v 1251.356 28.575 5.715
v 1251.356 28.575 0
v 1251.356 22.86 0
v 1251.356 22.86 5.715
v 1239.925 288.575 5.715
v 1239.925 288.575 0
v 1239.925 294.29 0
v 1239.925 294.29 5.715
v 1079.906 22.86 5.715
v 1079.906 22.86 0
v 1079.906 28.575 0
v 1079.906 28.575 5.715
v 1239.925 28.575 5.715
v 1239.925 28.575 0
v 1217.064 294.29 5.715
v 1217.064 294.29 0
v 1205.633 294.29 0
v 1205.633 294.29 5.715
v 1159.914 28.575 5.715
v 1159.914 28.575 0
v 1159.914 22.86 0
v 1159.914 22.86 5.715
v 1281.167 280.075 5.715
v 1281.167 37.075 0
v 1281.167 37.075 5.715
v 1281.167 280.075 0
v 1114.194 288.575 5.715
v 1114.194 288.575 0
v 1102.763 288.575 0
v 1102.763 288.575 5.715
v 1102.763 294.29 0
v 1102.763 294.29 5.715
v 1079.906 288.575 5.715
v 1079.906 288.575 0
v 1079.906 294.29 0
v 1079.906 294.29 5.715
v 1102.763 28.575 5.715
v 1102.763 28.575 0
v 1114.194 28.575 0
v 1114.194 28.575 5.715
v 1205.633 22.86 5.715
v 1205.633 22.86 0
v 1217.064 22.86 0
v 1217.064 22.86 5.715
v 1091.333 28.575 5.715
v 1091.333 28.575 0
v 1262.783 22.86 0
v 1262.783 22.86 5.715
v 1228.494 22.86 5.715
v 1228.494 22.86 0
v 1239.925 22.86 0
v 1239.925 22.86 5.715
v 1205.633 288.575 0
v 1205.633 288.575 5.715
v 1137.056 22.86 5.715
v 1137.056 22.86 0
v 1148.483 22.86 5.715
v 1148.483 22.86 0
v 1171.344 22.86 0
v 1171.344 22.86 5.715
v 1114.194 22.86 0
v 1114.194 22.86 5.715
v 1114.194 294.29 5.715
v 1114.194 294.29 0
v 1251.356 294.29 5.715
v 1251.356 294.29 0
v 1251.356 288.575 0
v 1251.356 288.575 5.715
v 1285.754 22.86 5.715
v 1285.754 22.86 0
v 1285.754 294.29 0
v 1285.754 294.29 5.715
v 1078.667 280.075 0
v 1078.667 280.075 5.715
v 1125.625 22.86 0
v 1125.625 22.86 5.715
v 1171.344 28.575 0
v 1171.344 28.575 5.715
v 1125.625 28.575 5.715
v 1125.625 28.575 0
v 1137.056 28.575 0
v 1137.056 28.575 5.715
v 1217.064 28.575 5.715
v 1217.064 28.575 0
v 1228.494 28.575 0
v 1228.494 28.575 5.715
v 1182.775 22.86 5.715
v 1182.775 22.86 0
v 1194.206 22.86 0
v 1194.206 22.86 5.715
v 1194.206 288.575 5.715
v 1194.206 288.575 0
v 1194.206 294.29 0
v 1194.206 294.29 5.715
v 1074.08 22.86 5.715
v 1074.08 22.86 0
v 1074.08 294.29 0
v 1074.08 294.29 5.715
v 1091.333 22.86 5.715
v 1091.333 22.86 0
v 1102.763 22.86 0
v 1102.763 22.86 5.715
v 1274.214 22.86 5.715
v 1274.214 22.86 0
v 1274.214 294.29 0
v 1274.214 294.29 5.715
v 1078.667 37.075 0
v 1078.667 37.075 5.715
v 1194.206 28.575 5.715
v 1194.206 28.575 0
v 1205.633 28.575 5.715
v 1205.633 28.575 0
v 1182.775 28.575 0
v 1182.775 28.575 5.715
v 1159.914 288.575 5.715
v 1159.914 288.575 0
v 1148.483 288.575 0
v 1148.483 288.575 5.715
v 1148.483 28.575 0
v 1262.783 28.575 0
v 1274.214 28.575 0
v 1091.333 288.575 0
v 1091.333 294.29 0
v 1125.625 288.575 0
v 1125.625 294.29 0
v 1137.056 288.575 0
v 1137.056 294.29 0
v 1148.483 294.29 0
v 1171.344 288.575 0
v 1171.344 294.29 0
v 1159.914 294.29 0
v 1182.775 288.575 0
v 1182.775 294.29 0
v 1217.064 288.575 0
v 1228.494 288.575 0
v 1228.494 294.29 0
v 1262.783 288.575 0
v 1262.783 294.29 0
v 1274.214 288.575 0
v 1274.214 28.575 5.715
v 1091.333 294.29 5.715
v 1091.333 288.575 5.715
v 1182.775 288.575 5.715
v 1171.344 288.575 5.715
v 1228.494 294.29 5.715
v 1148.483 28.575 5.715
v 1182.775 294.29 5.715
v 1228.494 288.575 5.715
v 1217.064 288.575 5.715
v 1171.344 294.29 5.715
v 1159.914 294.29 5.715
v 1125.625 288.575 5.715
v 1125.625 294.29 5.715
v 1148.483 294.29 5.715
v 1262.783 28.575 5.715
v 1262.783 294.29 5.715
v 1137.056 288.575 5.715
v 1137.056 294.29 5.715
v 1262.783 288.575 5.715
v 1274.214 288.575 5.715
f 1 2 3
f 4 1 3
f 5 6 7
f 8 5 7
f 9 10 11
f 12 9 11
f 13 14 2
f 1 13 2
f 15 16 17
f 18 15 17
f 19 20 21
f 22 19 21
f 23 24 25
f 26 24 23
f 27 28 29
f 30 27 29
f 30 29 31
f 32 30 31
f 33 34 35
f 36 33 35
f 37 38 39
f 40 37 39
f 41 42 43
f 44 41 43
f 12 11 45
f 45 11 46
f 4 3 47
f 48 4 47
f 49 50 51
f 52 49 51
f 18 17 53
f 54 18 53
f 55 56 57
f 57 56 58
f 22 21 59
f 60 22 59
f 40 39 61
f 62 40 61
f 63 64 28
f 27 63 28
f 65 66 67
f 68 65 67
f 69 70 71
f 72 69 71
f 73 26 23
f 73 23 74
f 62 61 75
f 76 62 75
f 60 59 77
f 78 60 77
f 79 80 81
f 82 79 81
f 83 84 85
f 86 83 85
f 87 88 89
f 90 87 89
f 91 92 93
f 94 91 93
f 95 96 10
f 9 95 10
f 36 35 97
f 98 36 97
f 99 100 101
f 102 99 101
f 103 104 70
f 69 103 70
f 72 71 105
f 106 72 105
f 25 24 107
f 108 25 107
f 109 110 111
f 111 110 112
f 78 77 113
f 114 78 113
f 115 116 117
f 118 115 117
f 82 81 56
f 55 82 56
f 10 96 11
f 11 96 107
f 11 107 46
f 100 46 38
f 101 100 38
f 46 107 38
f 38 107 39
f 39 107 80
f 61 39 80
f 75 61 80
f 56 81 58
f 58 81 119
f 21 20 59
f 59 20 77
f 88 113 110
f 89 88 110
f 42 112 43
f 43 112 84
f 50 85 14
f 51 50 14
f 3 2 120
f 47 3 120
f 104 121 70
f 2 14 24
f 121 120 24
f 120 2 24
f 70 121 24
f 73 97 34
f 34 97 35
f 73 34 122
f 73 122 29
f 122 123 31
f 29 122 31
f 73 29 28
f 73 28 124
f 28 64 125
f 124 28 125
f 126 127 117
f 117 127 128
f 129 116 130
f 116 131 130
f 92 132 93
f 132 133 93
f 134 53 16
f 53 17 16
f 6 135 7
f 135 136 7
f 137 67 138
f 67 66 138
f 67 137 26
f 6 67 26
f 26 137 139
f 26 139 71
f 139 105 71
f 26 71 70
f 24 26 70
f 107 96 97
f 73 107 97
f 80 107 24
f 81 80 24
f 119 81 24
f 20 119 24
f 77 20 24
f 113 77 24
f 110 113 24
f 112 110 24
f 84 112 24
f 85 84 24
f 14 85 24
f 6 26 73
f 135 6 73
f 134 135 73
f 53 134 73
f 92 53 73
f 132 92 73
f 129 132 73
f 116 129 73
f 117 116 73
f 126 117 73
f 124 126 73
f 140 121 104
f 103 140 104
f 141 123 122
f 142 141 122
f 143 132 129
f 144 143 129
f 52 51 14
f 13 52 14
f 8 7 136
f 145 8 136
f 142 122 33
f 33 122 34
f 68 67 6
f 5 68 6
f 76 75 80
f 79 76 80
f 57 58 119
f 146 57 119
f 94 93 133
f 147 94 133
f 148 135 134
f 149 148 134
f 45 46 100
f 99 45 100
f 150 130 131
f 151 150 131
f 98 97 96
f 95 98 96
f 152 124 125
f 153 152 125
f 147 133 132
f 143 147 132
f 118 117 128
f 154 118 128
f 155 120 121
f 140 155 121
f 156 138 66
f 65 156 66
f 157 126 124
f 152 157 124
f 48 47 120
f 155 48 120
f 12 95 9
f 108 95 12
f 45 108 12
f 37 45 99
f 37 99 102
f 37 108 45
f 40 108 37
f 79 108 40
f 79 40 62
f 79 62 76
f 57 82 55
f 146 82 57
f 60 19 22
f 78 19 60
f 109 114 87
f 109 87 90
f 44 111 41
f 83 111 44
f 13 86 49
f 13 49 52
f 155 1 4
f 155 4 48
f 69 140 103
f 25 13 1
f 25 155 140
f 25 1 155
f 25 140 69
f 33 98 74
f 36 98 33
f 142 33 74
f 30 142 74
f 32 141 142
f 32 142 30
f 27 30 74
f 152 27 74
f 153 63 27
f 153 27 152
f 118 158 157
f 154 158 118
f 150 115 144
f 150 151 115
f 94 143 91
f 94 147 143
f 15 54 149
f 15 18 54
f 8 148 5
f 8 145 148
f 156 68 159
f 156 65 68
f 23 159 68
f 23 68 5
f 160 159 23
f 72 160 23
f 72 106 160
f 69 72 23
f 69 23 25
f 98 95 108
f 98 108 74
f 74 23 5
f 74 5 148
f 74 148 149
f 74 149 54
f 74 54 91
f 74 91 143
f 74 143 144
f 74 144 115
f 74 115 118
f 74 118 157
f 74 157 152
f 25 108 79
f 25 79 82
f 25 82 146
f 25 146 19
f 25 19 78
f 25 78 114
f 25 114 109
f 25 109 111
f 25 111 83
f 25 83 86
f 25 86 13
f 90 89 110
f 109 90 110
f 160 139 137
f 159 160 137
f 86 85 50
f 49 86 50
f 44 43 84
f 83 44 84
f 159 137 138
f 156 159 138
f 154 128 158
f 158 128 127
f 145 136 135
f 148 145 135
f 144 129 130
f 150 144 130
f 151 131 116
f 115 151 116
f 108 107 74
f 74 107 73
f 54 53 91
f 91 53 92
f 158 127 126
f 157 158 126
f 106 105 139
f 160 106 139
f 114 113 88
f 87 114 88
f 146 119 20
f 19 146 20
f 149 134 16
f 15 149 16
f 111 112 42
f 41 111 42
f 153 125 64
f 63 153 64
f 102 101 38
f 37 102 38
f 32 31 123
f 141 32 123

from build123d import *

# Parameters (mm, degrees)
BOSS_EXTRUDE1_DEPTH = 5.715
SKETCH2_W           = 202.5
SKETCH2_H           = 243
CUT_EXTRUDE1_DEPTH  = 6.715


with BuildPart() as part:
    # Model → Boss-Extrude1 (new body)
    with BuildSketch(Plane.XY):
        Polygon((1074.08036017, 22.860238699), (1079.905563672, 22.860238699), (1079.905563672, 28.575245224), (1091.332742073, 28.575245224), (1091.332742073, 22.860238699), (1102.763463785, 22.860238699), (1102.763463785, 28.575245224), (1114.194185497, 28.575245224), (1114.194185497, 22.860238699), (1125.62490721, 22.860238699), (1125.62490721, 28.575245224), (1137.055628922, 28.575245224), (1137.055628922, 22.860238699), (1148.482807323, 22.860238699), (1148.482807323, 28.575245224), (1159.913529035, 28.575245224), (1159.913529035, 22.860238699), (1171.344250747, 22.860238699), (1171.344250747, 28.575245224), (1182.77497246, 28.575245224), (1182.77497246, 22.860238699), (1194.205694172, 22.860238699), (1194.205694172, 28.575245224), (1205.632872573, 28.575245224), (1205.632872573, 22.860238699), (1217.063594285, 22.860238699), (1217.063594285, 28.575245224), (1228.494315997, 28.575245224), (1228.494315997, 22.860238699), (1239.92503771, 22.860238699), (1239.92503771, 28.575245224), (1251.355759422, 28.575245224), (1251.355759422, 22.860238699), (1262.782937823, 22.860238699), (1262.782937823, 28.575245224), (1274.213659535, 28.575245224), (1274.213659535, 22.860238699), (1280.038863036, 22.860238699), (1285.754223893, 22.860238699), (1285.754223893, 28.575245224), (1285.754223893, 288.575408216), (1285.754223893, 294.290414741), (1280.038863036, 294.290414741), (1274.213659535, 294.290414741), (1274.213659535, 288.575408216), (1262.782937823, 288.575408216), (1262.782937823, 294.290414741), (1251.355759422, 294.290414741), (1251.355759422, 288.575408216), (1239.92503771, 288.575408216), (1239.92503771, 294.290414741), (1228.494315997, 294.290414741), (1228.494315997, 288.575408216), (1217.063594285, 288.575408216), (1217.063594285, 294.290414741), (1205.632872573, 294.290414741), (1205.632872573, 288.575408216), (1194.205694172, 288.575408216), (1194.205694172, 294.290414741), (1182.77497246, 294.290414741), (1182.77497246, 288.575408216), (1171.344250747, 288.575408216), (1171.344250747, 294.290414741), (1159.913529035, 294.290414741), (1159.913529035, 288.575408216), (1148.482807323, 288.575408216), (1148.482807323, 294.290414741), (1137.055628922, 294.290414741), (1137.055628922, 288.575408216), (1125.62490721, 288.575408216), (1125.62490721, 294.290414741), (1114.194185497, 294.290414741), (1114.194185497, 288.575408216), (1102.763463785, 288.575408216), (1102.763463785, 294.290414741), (1091.332742073, 294.290414741), (1091.332742073, 288.575408216), (1079.905563672, 288.575408216), (1079.905563672, 294.290414741), (1074.08036017, 294.290414741), (1074.08036017, 288.575408216), (1074.08036017, 28.575245224), align=None)
    extrude(amount=BOSS_EXTRUDE1_DEPTH)

    # Sketch2 → Cut-Extrude1 (cut, through all)
    with BuildSketch(Plane(origin=(0, 0, 0), x_dir=(-1, 0, 0), z_dir=(0, 0, -1))):
        with Locations((-1179.917292032, 158.575323457)):
            Rectangle(SKETCH2_W, SKETCH2_H)
    extrude(amount=-CUT_EXTRUDE1_DEPTH, mode=Mode.SUBTRACT)


solid = part.part
